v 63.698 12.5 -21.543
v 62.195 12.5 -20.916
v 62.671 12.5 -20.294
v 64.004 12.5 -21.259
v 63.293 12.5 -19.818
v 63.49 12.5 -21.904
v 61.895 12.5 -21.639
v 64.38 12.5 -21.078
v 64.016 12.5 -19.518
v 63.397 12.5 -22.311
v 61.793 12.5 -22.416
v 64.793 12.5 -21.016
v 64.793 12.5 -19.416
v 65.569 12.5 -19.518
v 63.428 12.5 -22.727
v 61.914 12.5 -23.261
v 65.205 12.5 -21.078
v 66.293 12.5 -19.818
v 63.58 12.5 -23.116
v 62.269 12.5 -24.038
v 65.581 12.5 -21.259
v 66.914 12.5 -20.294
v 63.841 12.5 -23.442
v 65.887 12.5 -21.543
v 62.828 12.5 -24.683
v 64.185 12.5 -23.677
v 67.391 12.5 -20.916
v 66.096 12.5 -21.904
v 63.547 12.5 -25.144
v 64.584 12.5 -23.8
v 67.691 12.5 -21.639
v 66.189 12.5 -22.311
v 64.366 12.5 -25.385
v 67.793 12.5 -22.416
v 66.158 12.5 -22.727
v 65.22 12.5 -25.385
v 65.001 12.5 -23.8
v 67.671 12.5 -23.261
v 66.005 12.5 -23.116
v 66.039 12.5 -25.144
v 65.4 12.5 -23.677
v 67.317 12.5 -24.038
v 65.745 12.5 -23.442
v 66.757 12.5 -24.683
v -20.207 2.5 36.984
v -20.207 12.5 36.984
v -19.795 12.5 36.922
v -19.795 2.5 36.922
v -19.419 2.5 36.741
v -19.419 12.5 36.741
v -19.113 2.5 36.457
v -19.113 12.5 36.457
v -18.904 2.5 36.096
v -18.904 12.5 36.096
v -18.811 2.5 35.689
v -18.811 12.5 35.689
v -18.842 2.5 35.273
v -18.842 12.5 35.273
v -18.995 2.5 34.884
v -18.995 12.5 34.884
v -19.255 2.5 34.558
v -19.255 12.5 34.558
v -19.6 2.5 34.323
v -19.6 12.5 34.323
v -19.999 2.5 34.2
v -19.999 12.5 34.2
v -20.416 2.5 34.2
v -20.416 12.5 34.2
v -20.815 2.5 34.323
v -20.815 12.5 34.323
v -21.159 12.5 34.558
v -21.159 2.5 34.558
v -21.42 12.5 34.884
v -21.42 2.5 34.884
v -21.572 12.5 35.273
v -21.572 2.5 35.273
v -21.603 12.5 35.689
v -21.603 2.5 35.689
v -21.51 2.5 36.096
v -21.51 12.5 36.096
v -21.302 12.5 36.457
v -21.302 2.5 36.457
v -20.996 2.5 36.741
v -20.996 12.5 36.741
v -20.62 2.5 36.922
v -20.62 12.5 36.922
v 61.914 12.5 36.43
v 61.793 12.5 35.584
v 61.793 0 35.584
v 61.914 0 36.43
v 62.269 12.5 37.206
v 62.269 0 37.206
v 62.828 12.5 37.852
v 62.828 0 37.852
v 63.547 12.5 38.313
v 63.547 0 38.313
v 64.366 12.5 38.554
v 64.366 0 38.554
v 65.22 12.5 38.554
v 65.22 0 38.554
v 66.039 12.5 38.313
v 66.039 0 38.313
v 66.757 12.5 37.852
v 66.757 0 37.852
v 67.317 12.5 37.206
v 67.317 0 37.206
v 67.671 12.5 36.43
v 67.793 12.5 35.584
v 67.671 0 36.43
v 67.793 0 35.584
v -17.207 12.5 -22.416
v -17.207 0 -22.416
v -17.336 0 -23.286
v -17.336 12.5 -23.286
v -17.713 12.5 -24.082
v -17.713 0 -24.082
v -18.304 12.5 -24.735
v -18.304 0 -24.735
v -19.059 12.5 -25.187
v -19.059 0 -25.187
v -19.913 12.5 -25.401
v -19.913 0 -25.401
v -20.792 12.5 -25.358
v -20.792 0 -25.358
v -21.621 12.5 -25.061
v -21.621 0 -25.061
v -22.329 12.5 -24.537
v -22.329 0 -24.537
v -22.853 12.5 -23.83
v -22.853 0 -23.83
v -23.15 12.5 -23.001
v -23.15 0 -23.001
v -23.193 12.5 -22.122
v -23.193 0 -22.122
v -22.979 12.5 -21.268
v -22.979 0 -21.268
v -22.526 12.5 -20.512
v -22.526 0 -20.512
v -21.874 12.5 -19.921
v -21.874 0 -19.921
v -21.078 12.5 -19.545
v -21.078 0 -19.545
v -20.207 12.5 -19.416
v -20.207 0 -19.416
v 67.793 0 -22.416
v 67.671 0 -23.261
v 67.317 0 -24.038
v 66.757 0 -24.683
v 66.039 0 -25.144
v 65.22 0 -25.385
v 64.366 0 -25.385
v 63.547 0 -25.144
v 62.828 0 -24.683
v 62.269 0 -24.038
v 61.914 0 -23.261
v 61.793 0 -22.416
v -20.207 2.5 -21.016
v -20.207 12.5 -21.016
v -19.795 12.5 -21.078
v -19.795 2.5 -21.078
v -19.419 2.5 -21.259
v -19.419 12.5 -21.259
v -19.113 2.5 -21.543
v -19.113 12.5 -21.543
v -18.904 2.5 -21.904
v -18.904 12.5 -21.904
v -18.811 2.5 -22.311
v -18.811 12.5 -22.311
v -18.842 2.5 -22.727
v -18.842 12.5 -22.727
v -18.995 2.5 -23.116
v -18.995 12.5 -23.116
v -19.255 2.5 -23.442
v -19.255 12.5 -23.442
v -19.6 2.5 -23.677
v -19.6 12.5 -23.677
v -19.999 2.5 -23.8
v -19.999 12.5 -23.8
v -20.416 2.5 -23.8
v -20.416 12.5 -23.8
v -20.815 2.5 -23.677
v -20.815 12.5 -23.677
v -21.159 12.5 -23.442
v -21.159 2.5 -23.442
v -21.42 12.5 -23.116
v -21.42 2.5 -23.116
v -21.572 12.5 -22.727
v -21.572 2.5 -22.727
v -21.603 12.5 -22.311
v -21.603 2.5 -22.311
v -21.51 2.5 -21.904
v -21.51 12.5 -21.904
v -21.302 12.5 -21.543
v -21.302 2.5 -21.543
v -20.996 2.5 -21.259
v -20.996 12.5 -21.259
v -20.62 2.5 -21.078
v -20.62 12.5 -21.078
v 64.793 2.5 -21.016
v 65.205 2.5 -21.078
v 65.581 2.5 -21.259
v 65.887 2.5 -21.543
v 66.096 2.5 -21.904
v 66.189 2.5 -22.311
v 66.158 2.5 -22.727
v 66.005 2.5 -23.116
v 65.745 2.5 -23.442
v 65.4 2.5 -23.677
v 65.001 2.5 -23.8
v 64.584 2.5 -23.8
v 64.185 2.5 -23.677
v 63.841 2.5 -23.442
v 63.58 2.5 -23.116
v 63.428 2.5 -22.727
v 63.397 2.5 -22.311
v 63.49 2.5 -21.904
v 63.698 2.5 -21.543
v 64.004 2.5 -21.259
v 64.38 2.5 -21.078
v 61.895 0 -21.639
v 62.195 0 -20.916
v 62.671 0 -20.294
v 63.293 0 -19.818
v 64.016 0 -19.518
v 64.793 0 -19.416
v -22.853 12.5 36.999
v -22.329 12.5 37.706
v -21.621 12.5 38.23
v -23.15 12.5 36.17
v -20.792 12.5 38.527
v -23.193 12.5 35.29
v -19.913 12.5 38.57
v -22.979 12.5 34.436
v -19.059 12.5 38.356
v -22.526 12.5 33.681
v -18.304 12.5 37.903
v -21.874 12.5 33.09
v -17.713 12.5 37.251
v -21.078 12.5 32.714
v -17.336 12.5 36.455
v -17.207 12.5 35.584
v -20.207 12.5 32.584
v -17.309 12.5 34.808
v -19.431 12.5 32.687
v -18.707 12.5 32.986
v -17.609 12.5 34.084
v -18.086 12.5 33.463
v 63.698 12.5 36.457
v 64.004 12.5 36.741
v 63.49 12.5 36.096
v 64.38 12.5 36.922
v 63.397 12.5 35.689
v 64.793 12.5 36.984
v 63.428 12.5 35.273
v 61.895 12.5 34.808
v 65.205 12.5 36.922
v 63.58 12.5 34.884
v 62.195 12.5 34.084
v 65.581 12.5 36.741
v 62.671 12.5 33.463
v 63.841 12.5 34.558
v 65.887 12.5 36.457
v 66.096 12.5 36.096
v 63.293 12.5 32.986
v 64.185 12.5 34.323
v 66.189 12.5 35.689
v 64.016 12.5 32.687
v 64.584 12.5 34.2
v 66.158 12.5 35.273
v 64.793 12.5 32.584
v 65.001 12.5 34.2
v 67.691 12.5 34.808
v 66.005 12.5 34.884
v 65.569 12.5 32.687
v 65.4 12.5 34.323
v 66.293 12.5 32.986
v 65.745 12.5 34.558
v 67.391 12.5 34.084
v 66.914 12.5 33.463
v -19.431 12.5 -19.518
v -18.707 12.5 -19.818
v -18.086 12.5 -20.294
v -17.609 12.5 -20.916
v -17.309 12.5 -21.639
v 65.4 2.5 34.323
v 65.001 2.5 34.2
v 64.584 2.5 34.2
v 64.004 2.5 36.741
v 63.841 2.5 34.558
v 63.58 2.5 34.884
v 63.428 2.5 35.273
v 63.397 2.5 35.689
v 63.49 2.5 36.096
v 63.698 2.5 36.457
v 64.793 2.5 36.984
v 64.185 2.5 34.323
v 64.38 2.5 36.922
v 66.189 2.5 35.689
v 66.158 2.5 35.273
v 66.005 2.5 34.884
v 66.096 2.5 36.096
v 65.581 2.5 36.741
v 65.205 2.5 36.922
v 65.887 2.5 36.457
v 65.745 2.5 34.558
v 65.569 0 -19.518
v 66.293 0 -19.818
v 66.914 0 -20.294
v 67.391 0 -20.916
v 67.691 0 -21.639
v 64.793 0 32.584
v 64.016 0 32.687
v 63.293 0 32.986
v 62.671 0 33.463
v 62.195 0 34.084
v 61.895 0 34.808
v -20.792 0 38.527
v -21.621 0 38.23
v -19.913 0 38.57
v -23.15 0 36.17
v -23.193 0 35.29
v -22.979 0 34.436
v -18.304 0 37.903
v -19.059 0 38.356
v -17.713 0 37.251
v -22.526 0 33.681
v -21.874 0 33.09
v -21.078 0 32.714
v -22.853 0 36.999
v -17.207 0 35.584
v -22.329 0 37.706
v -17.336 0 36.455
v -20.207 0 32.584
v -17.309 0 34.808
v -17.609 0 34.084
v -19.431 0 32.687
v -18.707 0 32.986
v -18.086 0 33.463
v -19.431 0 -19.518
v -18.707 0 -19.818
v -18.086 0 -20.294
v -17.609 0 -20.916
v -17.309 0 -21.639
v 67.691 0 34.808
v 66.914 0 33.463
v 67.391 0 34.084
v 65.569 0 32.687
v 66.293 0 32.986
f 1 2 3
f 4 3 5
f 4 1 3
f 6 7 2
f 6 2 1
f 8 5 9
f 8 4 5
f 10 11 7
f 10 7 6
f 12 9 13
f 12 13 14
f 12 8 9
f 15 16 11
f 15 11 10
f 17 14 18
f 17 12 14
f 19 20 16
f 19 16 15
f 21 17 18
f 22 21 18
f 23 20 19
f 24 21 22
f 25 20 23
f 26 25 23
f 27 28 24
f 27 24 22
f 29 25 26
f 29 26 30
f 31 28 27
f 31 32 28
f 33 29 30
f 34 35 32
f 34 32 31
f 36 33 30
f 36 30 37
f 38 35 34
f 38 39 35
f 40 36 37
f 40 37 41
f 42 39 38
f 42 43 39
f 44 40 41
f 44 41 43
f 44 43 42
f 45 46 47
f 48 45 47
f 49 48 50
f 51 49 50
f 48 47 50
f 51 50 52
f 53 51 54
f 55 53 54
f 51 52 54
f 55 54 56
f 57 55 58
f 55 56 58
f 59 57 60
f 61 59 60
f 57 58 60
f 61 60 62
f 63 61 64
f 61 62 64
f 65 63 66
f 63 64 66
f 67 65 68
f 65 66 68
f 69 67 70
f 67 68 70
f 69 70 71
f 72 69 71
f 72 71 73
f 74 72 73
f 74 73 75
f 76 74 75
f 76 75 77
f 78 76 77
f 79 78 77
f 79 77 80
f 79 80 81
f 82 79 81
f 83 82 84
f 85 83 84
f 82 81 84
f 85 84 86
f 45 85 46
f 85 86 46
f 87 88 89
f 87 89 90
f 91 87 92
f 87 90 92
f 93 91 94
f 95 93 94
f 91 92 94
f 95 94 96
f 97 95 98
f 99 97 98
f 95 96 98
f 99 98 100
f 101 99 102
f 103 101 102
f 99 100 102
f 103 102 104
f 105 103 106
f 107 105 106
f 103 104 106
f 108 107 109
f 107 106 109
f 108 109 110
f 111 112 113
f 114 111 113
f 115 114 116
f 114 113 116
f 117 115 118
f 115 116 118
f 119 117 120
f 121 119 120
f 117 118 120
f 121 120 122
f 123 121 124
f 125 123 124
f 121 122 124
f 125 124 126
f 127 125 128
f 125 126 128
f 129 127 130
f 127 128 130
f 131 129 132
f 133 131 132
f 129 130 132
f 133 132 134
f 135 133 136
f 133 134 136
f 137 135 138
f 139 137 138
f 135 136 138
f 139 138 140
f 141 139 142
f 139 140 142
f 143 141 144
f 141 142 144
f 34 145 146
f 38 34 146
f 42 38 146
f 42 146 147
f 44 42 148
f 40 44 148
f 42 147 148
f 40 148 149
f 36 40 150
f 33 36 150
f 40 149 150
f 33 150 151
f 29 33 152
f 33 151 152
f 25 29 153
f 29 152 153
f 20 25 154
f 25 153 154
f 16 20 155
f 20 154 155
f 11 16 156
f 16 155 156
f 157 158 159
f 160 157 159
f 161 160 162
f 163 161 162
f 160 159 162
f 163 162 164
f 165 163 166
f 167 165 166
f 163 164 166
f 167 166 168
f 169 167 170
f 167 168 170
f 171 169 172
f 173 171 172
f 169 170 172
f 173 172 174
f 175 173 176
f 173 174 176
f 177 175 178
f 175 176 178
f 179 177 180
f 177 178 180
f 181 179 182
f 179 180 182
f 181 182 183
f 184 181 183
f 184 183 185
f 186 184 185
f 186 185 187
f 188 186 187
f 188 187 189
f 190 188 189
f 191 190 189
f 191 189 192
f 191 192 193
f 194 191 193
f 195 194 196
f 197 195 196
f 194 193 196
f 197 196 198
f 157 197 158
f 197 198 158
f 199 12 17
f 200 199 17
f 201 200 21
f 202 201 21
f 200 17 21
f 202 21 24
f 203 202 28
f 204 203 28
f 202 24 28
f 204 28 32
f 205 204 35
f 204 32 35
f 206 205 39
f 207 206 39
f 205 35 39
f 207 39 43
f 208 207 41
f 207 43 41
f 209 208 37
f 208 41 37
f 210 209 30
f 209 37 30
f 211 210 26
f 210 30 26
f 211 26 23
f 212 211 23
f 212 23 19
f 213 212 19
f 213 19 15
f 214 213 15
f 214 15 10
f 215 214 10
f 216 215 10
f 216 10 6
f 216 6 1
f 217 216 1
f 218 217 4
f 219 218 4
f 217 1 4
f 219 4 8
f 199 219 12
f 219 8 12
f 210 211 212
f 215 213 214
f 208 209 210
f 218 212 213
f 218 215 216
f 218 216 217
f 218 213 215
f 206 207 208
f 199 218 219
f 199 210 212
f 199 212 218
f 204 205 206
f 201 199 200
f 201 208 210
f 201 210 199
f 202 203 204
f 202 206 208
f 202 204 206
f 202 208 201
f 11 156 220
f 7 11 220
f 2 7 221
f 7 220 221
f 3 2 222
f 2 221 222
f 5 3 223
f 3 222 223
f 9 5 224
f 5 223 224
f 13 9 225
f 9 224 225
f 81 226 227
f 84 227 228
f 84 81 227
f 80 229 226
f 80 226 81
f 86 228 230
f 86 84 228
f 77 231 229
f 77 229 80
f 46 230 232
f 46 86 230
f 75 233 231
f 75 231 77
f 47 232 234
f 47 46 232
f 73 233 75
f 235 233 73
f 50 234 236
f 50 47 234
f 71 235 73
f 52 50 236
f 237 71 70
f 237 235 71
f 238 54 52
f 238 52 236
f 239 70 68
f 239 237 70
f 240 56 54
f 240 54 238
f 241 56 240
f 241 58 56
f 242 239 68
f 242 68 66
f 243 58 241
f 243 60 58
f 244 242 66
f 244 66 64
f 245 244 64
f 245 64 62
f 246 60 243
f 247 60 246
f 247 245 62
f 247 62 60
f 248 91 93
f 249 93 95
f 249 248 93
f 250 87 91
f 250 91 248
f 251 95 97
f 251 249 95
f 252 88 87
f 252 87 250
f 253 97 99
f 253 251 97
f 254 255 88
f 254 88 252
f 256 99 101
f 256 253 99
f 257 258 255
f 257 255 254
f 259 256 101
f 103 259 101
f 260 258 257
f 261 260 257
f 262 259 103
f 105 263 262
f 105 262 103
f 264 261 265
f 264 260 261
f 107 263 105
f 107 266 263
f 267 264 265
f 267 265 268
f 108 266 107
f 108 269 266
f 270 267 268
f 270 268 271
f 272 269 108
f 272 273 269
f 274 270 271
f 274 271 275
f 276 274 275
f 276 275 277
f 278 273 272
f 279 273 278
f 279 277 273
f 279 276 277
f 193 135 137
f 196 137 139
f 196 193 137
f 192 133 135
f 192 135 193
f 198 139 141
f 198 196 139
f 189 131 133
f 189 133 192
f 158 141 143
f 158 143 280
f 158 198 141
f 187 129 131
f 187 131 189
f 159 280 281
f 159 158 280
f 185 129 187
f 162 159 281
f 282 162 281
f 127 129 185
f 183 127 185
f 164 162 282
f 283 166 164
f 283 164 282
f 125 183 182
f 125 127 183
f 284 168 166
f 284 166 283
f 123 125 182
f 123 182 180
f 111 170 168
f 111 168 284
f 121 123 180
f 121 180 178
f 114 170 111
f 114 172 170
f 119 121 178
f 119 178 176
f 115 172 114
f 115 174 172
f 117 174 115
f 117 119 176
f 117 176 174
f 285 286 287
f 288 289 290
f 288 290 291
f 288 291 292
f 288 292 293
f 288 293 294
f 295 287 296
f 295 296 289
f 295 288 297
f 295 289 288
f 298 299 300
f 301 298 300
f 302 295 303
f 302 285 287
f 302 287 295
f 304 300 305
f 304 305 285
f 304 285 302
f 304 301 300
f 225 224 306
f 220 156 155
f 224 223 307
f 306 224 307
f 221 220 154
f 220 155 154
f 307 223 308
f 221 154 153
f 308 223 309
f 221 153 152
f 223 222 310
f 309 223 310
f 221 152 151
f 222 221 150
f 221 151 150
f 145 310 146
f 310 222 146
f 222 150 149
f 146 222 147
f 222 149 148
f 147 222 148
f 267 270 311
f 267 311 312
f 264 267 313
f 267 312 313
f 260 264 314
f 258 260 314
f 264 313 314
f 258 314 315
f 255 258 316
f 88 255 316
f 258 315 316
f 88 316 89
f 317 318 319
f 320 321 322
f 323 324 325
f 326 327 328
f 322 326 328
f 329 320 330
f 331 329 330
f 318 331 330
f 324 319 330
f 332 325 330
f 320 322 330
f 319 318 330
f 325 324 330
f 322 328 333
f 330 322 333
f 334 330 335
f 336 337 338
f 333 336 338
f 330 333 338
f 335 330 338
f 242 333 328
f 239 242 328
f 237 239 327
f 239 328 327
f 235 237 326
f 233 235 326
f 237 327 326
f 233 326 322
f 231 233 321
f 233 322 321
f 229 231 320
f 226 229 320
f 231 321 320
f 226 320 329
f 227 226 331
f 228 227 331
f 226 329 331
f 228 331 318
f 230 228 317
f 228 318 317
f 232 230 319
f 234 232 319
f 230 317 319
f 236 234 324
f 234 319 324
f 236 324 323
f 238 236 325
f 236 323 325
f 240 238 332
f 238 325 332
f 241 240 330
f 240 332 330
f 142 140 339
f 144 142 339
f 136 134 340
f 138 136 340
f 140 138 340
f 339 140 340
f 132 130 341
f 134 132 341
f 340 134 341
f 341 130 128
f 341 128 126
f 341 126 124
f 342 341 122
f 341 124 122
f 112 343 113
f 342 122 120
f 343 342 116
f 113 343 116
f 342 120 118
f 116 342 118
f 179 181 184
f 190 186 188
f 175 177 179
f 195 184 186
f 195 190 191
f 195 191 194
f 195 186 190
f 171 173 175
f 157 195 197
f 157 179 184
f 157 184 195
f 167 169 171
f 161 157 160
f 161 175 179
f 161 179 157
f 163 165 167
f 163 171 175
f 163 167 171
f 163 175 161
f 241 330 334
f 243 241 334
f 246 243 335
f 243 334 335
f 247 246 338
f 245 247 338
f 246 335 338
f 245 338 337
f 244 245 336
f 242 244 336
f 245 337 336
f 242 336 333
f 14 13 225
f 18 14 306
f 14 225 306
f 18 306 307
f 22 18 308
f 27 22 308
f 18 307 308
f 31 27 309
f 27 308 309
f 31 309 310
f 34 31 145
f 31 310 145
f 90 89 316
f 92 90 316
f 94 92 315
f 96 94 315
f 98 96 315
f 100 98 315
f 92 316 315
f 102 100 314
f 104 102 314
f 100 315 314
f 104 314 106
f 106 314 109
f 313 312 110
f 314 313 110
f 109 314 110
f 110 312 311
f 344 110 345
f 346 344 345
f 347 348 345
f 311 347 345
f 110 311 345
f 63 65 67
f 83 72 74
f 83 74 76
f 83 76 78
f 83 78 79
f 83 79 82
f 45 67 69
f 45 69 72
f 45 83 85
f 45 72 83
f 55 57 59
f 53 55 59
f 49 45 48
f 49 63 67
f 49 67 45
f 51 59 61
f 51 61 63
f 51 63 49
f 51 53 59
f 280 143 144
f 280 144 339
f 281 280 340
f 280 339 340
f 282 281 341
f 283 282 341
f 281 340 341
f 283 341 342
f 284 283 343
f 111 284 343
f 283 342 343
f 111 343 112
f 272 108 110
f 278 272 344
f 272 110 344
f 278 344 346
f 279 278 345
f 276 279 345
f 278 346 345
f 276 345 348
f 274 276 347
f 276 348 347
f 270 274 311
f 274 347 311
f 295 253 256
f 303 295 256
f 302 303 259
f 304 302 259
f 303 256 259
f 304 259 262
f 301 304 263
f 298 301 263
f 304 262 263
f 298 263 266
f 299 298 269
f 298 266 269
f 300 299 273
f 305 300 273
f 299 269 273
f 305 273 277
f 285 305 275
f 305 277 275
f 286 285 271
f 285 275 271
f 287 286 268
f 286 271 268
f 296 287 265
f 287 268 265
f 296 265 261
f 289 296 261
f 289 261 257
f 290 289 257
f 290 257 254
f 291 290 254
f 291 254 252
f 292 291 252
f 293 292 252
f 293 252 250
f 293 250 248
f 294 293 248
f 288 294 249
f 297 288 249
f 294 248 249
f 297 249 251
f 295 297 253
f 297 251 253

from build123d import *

# Parameters (mm, degrees)
BOSS_EXTRUDE1_DEPTH = 12.5
SKETCH2_R           = 1.4
CUT_EXTRUDE1_DEPTH  = 10


with BuildPart() as part:
    # Sketch1 → Boss-Extrude1 (new body)
    with BuildSketch(Plane(origin=(0, 0, 0), x_dir=(1, 0, 0), z_dir=(0, 1, 0))):
        with BuildLine():
            ThreePointArc((-17.207199178, -35.584421134), (-18.085878834, -33.46310079), (-20.207199178, -32.584421134))
            Line((-20.207199178, -32.584421134), (-20.207199178, -35.584421134))
            Line((-20.207199178, -35.584421134), (-17.207199178, -35.584421134))
        make_face()
        with BuildLine():
            Line((-20.207199178, -35.584421134), (-20.207199178, -32.584421134))
            ThreePointArc((-20.207199178, -32.584421134), (-22.328519521, -37.705741477), (-17.207199178, -35.584421134))
            Line((-17.207199178, -35.584421134), (-20.207199178, -35.584421134))
        make_face()
        with BuildLine():
            Line((-20.207199178, 19.415578866), (-20.207199178, 22.415578866))
            Line((-20.207199178, 22.415578866), (-17.207199178, 22.415578866))
            ThreePointArc((-17.207199178, 22.415578866), (-22.328519521, 24.53689921), (-20.207199178, 19.415578866))
        make_face()
        with BuildLine():
            Line((-17.207199178, 22.415578866), (-20.207199178, 22.415578866))
            Line((-20.207199178, 22.415578866), (-20.207199178, 19.415578866))
            ThreePointArc((-20.207199178, 19.415578866), (-18.085878834, 20.294258523), (-17.207199178, 22.415578866))
        make_face()
        with BuildLine():
            ThreePointArc((67.792800822, -35.584421134), (66.914121166, -33.46310079), (64.792800822, -32.584421134))
            Line((64.792800822, -32.584421134), (64.792800822, -35.584421134))
            Line((64.792800822, -35.584421134), (61.792800822, -35.584421134))
            ThreePointArc((61.792800822, -35.584421134), (64.792800822, -38.584421134), (67.792800822, -35.584421134))
        make_face()
        with BuildLine():
            Line((64.792800822, -35.584421134), (64.792800822, -32.584421134))
            ThreePointArc((64.792800822, -32.584421134), (62.671480479, -33.46310079), (61.792800822, -35.584421134))
            Line((61.792800822, -35.584421134), (64.792800822, -35.584421134))
        make_face()
        with BuildLine():
            ThreePointArc((67.792800822, 22.415578866), (64.792800822, 25.415578866), (61.792800822, 22.415578866))
            Line((61.792800822, 22.415578866), (64.792800822, 22.415578866))
            Line((64.792800822, 22.415578866), (64.792800822, 19.415578866))
            ThreePointArc((64.792800822, 19.415578866), (66.914121166, 20.294258523), (67.792800822, 22.415578866))
        make_face()
        with BuildLine():
            Line((64.792800822, 22.415578866), (61.792800822, 22.415578866))
            ThreePointArc((61.792800822, 22.415578866), (62.671480479, 20.294258523), (64.792800822, 19.415578866))
            Line((64.792800822, 19.415578866), (64.792800822, 22.415578866))
        make_face()
    extrude(amount=BOSS_EXTRUDE1_DEPTH)

    # Sketch2 → Cut-Extrude1 (cut)
    with BuildSketch(Plane(origin=(0, 12.5, 0), x_dir=(1, 0, 0), z_dir=(0, 1, 0))):
        with Locations(Location((-20.207199178, 22.415578866, 0), (0, 0, 270))):
            Circle(SKETCH2_R)
        with Locations(Location((-20.207199178, -35.584421134, 0), (0, 0, 270))):
            Circle(SKETCH2_R)
        with Locations(Location((64.792800822, -35.584421134, 0), (0, 0, 270))):
            Circle(SKETCH2_R)
        with Locations(Location((64.792800822, 22.415578866, 0), (0, 0, 270))):
            Circle(SKETCH2_R)
    extrude(amount=-CUT_EXTRUDE1_DEPTH, mode=Mode.SUBTRACT)


solid = part.part
